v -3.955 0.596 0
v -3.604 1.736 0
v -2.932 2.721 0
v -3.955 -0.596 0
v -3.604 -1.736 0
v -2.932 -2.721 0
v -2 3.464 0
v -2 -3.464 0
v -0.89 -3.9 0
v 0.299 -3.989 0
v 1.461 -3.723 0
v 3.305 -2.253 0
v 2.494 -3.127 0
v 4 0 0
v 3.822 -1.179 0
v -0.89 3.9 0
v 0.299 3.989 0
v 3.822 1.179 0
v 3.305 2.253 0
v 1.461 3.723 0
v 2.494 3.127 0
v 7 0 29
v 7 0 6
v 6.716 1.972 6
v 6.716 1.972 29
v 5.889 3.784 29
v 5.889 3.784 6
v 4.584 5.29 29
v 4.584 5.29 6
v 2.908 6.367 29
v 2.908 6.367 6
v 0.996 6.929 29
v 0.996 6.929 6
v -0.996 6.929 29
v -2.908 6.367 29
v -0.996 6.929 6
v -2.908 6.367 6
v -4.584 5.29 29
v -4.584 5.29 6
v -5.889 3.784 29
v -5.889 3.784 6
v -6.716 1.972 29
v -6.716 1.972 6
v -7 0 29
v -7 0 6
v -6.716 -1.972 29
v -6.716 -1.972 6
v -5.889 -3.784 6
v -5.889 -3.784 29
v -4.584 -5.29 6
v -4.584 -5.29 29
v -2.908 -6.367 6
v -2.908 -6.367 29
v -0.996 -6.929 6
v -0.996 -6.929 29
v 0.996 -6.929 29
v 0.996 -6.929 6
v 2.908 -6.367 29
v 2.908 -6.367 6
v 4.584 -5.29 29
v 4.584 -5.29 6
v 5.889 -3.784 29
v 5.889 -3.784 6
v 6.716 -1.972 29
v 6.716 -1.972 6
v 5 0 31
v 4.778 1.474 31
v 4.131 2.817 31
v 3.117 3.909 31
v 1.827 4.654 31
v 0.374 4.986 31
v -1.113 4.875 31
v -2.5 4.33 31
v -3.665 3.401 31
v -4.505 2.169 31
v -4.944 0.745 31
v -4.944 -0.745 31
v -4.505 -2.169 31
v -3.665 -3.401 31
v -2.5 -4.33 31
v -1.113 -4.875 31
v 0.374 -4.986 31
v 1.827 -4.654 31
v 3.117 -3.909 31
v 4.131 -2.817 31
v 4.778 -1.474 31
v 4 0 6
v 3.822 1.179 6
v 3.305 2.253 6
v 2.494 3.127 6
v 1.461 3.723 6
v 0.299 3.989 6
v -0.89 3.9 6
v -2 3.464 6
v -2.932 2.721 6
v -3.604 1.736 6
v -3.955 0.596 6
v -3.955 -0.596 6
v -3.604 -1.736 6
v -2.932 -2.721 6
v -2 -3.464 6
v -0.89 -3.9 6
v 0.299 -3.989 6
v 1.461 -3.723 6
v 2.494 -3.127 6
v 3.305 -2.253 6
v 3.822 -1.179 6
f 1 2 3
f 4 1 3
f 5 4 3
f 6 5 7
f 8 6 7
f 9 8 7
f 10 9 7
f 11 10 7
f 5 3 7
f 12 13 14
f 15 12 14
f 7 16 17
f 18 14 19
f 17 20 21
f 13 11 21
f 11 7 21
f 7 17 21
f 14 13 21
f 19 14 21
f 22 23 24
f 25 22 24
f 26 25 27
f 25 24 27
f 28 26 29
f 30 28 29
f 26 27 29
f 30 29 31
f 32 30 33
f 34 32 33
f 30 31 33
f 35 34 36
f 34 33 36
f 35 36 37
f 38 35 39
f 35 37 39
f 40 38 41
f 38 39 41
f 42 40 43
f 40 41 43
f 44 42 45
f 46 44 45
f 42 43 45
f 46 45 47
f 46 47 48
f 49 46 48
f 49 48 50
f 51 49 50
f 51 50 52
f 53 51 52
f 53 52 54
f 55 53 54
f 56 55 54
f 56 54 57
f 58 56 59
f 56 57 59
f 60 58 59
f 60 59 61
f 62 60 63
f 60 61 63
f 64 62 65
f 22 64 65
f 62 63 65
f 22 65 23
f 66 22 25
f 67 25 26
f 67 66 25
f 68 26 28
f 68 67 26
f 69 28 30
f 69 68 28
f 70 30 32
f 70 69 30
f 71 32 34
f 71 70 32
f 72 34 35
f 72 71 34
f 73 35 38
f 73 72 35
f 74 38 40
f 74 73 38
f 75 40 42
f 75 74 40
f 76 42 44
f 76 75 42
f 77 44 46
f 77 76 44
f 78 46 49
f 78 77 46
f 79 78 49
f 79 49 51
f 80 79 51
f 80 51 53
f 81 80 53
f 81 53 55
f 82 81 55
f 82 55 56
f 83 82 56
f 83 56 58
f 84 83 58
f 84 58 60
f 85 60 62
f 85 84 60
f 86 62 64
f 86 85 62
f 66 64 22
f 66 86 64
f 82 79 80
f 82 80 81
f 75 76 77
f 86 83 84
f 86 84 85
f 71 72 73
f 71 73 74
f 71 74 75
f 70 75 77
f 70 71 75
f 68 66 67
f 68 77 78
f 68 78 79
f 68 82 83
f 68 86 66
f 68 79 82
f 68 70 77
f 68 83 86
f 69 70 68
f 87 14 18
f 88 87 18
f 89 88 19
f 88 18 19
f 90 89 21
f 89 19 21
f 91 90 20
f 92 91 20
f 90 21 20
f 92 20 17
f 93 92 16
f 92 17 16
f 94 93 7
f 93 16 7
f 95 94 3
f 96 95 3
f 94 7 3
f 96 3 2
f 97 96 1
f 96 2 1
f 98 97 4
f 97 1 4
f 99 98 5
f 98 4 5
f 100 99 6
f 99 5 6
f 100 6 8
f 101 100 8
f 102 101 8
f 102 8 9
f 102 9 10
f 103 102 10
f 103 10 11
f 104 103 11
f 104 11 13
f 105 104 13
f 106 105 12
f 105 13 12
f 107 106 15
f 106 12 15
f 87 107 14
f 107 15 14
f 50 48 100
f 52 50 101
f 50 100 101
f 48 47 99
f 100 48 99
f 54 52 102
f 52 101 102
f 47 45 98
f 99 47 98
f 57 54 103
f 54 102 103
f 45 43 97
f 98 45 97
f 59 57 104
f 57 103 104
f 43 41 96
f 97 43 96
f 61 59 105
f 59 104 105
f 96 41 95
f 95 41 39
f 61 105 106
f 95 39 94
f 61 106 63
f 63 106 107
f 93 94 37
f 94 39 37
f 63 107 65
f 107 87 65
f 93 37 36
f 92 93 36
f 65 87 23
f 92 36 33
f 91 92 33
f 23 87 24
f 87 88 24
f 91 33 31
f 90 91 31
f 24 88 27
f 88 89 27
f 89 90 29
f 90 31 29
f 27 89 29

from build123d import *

# Parameters (mm, degrees)
F0_R     = 4
F1_DEPTH = 6
F2_R     = 7
F2_R_2   = 4
F3_DEPTH = 25
F4_SIZE  = 2


with BuildPart() as f1:
    # F0 (on Top) → F1 (new body)
    with BuildSketch(Plane.XY):
        Circle(F0_R)
    extrude(amount=F1_DEPTH)

    # F2 (on face) → F3 (join)
    with BuildSketch(Plane.XY.offset(6)):
        Circle(F2_R)
        Circle(F2_R_2, mode=Mode.SUBTRACT)
        Circle(F2_R_2)
    extrude(amount=F3_DEPTH)

    # F4
    f4_edges = [f1.edges().sort_by_distance(p)[0] for p in [
        (-7, 0, 31),
    ]]
    chamfer(f4_edges, length=F4_SIZE)


solid = f1.part
